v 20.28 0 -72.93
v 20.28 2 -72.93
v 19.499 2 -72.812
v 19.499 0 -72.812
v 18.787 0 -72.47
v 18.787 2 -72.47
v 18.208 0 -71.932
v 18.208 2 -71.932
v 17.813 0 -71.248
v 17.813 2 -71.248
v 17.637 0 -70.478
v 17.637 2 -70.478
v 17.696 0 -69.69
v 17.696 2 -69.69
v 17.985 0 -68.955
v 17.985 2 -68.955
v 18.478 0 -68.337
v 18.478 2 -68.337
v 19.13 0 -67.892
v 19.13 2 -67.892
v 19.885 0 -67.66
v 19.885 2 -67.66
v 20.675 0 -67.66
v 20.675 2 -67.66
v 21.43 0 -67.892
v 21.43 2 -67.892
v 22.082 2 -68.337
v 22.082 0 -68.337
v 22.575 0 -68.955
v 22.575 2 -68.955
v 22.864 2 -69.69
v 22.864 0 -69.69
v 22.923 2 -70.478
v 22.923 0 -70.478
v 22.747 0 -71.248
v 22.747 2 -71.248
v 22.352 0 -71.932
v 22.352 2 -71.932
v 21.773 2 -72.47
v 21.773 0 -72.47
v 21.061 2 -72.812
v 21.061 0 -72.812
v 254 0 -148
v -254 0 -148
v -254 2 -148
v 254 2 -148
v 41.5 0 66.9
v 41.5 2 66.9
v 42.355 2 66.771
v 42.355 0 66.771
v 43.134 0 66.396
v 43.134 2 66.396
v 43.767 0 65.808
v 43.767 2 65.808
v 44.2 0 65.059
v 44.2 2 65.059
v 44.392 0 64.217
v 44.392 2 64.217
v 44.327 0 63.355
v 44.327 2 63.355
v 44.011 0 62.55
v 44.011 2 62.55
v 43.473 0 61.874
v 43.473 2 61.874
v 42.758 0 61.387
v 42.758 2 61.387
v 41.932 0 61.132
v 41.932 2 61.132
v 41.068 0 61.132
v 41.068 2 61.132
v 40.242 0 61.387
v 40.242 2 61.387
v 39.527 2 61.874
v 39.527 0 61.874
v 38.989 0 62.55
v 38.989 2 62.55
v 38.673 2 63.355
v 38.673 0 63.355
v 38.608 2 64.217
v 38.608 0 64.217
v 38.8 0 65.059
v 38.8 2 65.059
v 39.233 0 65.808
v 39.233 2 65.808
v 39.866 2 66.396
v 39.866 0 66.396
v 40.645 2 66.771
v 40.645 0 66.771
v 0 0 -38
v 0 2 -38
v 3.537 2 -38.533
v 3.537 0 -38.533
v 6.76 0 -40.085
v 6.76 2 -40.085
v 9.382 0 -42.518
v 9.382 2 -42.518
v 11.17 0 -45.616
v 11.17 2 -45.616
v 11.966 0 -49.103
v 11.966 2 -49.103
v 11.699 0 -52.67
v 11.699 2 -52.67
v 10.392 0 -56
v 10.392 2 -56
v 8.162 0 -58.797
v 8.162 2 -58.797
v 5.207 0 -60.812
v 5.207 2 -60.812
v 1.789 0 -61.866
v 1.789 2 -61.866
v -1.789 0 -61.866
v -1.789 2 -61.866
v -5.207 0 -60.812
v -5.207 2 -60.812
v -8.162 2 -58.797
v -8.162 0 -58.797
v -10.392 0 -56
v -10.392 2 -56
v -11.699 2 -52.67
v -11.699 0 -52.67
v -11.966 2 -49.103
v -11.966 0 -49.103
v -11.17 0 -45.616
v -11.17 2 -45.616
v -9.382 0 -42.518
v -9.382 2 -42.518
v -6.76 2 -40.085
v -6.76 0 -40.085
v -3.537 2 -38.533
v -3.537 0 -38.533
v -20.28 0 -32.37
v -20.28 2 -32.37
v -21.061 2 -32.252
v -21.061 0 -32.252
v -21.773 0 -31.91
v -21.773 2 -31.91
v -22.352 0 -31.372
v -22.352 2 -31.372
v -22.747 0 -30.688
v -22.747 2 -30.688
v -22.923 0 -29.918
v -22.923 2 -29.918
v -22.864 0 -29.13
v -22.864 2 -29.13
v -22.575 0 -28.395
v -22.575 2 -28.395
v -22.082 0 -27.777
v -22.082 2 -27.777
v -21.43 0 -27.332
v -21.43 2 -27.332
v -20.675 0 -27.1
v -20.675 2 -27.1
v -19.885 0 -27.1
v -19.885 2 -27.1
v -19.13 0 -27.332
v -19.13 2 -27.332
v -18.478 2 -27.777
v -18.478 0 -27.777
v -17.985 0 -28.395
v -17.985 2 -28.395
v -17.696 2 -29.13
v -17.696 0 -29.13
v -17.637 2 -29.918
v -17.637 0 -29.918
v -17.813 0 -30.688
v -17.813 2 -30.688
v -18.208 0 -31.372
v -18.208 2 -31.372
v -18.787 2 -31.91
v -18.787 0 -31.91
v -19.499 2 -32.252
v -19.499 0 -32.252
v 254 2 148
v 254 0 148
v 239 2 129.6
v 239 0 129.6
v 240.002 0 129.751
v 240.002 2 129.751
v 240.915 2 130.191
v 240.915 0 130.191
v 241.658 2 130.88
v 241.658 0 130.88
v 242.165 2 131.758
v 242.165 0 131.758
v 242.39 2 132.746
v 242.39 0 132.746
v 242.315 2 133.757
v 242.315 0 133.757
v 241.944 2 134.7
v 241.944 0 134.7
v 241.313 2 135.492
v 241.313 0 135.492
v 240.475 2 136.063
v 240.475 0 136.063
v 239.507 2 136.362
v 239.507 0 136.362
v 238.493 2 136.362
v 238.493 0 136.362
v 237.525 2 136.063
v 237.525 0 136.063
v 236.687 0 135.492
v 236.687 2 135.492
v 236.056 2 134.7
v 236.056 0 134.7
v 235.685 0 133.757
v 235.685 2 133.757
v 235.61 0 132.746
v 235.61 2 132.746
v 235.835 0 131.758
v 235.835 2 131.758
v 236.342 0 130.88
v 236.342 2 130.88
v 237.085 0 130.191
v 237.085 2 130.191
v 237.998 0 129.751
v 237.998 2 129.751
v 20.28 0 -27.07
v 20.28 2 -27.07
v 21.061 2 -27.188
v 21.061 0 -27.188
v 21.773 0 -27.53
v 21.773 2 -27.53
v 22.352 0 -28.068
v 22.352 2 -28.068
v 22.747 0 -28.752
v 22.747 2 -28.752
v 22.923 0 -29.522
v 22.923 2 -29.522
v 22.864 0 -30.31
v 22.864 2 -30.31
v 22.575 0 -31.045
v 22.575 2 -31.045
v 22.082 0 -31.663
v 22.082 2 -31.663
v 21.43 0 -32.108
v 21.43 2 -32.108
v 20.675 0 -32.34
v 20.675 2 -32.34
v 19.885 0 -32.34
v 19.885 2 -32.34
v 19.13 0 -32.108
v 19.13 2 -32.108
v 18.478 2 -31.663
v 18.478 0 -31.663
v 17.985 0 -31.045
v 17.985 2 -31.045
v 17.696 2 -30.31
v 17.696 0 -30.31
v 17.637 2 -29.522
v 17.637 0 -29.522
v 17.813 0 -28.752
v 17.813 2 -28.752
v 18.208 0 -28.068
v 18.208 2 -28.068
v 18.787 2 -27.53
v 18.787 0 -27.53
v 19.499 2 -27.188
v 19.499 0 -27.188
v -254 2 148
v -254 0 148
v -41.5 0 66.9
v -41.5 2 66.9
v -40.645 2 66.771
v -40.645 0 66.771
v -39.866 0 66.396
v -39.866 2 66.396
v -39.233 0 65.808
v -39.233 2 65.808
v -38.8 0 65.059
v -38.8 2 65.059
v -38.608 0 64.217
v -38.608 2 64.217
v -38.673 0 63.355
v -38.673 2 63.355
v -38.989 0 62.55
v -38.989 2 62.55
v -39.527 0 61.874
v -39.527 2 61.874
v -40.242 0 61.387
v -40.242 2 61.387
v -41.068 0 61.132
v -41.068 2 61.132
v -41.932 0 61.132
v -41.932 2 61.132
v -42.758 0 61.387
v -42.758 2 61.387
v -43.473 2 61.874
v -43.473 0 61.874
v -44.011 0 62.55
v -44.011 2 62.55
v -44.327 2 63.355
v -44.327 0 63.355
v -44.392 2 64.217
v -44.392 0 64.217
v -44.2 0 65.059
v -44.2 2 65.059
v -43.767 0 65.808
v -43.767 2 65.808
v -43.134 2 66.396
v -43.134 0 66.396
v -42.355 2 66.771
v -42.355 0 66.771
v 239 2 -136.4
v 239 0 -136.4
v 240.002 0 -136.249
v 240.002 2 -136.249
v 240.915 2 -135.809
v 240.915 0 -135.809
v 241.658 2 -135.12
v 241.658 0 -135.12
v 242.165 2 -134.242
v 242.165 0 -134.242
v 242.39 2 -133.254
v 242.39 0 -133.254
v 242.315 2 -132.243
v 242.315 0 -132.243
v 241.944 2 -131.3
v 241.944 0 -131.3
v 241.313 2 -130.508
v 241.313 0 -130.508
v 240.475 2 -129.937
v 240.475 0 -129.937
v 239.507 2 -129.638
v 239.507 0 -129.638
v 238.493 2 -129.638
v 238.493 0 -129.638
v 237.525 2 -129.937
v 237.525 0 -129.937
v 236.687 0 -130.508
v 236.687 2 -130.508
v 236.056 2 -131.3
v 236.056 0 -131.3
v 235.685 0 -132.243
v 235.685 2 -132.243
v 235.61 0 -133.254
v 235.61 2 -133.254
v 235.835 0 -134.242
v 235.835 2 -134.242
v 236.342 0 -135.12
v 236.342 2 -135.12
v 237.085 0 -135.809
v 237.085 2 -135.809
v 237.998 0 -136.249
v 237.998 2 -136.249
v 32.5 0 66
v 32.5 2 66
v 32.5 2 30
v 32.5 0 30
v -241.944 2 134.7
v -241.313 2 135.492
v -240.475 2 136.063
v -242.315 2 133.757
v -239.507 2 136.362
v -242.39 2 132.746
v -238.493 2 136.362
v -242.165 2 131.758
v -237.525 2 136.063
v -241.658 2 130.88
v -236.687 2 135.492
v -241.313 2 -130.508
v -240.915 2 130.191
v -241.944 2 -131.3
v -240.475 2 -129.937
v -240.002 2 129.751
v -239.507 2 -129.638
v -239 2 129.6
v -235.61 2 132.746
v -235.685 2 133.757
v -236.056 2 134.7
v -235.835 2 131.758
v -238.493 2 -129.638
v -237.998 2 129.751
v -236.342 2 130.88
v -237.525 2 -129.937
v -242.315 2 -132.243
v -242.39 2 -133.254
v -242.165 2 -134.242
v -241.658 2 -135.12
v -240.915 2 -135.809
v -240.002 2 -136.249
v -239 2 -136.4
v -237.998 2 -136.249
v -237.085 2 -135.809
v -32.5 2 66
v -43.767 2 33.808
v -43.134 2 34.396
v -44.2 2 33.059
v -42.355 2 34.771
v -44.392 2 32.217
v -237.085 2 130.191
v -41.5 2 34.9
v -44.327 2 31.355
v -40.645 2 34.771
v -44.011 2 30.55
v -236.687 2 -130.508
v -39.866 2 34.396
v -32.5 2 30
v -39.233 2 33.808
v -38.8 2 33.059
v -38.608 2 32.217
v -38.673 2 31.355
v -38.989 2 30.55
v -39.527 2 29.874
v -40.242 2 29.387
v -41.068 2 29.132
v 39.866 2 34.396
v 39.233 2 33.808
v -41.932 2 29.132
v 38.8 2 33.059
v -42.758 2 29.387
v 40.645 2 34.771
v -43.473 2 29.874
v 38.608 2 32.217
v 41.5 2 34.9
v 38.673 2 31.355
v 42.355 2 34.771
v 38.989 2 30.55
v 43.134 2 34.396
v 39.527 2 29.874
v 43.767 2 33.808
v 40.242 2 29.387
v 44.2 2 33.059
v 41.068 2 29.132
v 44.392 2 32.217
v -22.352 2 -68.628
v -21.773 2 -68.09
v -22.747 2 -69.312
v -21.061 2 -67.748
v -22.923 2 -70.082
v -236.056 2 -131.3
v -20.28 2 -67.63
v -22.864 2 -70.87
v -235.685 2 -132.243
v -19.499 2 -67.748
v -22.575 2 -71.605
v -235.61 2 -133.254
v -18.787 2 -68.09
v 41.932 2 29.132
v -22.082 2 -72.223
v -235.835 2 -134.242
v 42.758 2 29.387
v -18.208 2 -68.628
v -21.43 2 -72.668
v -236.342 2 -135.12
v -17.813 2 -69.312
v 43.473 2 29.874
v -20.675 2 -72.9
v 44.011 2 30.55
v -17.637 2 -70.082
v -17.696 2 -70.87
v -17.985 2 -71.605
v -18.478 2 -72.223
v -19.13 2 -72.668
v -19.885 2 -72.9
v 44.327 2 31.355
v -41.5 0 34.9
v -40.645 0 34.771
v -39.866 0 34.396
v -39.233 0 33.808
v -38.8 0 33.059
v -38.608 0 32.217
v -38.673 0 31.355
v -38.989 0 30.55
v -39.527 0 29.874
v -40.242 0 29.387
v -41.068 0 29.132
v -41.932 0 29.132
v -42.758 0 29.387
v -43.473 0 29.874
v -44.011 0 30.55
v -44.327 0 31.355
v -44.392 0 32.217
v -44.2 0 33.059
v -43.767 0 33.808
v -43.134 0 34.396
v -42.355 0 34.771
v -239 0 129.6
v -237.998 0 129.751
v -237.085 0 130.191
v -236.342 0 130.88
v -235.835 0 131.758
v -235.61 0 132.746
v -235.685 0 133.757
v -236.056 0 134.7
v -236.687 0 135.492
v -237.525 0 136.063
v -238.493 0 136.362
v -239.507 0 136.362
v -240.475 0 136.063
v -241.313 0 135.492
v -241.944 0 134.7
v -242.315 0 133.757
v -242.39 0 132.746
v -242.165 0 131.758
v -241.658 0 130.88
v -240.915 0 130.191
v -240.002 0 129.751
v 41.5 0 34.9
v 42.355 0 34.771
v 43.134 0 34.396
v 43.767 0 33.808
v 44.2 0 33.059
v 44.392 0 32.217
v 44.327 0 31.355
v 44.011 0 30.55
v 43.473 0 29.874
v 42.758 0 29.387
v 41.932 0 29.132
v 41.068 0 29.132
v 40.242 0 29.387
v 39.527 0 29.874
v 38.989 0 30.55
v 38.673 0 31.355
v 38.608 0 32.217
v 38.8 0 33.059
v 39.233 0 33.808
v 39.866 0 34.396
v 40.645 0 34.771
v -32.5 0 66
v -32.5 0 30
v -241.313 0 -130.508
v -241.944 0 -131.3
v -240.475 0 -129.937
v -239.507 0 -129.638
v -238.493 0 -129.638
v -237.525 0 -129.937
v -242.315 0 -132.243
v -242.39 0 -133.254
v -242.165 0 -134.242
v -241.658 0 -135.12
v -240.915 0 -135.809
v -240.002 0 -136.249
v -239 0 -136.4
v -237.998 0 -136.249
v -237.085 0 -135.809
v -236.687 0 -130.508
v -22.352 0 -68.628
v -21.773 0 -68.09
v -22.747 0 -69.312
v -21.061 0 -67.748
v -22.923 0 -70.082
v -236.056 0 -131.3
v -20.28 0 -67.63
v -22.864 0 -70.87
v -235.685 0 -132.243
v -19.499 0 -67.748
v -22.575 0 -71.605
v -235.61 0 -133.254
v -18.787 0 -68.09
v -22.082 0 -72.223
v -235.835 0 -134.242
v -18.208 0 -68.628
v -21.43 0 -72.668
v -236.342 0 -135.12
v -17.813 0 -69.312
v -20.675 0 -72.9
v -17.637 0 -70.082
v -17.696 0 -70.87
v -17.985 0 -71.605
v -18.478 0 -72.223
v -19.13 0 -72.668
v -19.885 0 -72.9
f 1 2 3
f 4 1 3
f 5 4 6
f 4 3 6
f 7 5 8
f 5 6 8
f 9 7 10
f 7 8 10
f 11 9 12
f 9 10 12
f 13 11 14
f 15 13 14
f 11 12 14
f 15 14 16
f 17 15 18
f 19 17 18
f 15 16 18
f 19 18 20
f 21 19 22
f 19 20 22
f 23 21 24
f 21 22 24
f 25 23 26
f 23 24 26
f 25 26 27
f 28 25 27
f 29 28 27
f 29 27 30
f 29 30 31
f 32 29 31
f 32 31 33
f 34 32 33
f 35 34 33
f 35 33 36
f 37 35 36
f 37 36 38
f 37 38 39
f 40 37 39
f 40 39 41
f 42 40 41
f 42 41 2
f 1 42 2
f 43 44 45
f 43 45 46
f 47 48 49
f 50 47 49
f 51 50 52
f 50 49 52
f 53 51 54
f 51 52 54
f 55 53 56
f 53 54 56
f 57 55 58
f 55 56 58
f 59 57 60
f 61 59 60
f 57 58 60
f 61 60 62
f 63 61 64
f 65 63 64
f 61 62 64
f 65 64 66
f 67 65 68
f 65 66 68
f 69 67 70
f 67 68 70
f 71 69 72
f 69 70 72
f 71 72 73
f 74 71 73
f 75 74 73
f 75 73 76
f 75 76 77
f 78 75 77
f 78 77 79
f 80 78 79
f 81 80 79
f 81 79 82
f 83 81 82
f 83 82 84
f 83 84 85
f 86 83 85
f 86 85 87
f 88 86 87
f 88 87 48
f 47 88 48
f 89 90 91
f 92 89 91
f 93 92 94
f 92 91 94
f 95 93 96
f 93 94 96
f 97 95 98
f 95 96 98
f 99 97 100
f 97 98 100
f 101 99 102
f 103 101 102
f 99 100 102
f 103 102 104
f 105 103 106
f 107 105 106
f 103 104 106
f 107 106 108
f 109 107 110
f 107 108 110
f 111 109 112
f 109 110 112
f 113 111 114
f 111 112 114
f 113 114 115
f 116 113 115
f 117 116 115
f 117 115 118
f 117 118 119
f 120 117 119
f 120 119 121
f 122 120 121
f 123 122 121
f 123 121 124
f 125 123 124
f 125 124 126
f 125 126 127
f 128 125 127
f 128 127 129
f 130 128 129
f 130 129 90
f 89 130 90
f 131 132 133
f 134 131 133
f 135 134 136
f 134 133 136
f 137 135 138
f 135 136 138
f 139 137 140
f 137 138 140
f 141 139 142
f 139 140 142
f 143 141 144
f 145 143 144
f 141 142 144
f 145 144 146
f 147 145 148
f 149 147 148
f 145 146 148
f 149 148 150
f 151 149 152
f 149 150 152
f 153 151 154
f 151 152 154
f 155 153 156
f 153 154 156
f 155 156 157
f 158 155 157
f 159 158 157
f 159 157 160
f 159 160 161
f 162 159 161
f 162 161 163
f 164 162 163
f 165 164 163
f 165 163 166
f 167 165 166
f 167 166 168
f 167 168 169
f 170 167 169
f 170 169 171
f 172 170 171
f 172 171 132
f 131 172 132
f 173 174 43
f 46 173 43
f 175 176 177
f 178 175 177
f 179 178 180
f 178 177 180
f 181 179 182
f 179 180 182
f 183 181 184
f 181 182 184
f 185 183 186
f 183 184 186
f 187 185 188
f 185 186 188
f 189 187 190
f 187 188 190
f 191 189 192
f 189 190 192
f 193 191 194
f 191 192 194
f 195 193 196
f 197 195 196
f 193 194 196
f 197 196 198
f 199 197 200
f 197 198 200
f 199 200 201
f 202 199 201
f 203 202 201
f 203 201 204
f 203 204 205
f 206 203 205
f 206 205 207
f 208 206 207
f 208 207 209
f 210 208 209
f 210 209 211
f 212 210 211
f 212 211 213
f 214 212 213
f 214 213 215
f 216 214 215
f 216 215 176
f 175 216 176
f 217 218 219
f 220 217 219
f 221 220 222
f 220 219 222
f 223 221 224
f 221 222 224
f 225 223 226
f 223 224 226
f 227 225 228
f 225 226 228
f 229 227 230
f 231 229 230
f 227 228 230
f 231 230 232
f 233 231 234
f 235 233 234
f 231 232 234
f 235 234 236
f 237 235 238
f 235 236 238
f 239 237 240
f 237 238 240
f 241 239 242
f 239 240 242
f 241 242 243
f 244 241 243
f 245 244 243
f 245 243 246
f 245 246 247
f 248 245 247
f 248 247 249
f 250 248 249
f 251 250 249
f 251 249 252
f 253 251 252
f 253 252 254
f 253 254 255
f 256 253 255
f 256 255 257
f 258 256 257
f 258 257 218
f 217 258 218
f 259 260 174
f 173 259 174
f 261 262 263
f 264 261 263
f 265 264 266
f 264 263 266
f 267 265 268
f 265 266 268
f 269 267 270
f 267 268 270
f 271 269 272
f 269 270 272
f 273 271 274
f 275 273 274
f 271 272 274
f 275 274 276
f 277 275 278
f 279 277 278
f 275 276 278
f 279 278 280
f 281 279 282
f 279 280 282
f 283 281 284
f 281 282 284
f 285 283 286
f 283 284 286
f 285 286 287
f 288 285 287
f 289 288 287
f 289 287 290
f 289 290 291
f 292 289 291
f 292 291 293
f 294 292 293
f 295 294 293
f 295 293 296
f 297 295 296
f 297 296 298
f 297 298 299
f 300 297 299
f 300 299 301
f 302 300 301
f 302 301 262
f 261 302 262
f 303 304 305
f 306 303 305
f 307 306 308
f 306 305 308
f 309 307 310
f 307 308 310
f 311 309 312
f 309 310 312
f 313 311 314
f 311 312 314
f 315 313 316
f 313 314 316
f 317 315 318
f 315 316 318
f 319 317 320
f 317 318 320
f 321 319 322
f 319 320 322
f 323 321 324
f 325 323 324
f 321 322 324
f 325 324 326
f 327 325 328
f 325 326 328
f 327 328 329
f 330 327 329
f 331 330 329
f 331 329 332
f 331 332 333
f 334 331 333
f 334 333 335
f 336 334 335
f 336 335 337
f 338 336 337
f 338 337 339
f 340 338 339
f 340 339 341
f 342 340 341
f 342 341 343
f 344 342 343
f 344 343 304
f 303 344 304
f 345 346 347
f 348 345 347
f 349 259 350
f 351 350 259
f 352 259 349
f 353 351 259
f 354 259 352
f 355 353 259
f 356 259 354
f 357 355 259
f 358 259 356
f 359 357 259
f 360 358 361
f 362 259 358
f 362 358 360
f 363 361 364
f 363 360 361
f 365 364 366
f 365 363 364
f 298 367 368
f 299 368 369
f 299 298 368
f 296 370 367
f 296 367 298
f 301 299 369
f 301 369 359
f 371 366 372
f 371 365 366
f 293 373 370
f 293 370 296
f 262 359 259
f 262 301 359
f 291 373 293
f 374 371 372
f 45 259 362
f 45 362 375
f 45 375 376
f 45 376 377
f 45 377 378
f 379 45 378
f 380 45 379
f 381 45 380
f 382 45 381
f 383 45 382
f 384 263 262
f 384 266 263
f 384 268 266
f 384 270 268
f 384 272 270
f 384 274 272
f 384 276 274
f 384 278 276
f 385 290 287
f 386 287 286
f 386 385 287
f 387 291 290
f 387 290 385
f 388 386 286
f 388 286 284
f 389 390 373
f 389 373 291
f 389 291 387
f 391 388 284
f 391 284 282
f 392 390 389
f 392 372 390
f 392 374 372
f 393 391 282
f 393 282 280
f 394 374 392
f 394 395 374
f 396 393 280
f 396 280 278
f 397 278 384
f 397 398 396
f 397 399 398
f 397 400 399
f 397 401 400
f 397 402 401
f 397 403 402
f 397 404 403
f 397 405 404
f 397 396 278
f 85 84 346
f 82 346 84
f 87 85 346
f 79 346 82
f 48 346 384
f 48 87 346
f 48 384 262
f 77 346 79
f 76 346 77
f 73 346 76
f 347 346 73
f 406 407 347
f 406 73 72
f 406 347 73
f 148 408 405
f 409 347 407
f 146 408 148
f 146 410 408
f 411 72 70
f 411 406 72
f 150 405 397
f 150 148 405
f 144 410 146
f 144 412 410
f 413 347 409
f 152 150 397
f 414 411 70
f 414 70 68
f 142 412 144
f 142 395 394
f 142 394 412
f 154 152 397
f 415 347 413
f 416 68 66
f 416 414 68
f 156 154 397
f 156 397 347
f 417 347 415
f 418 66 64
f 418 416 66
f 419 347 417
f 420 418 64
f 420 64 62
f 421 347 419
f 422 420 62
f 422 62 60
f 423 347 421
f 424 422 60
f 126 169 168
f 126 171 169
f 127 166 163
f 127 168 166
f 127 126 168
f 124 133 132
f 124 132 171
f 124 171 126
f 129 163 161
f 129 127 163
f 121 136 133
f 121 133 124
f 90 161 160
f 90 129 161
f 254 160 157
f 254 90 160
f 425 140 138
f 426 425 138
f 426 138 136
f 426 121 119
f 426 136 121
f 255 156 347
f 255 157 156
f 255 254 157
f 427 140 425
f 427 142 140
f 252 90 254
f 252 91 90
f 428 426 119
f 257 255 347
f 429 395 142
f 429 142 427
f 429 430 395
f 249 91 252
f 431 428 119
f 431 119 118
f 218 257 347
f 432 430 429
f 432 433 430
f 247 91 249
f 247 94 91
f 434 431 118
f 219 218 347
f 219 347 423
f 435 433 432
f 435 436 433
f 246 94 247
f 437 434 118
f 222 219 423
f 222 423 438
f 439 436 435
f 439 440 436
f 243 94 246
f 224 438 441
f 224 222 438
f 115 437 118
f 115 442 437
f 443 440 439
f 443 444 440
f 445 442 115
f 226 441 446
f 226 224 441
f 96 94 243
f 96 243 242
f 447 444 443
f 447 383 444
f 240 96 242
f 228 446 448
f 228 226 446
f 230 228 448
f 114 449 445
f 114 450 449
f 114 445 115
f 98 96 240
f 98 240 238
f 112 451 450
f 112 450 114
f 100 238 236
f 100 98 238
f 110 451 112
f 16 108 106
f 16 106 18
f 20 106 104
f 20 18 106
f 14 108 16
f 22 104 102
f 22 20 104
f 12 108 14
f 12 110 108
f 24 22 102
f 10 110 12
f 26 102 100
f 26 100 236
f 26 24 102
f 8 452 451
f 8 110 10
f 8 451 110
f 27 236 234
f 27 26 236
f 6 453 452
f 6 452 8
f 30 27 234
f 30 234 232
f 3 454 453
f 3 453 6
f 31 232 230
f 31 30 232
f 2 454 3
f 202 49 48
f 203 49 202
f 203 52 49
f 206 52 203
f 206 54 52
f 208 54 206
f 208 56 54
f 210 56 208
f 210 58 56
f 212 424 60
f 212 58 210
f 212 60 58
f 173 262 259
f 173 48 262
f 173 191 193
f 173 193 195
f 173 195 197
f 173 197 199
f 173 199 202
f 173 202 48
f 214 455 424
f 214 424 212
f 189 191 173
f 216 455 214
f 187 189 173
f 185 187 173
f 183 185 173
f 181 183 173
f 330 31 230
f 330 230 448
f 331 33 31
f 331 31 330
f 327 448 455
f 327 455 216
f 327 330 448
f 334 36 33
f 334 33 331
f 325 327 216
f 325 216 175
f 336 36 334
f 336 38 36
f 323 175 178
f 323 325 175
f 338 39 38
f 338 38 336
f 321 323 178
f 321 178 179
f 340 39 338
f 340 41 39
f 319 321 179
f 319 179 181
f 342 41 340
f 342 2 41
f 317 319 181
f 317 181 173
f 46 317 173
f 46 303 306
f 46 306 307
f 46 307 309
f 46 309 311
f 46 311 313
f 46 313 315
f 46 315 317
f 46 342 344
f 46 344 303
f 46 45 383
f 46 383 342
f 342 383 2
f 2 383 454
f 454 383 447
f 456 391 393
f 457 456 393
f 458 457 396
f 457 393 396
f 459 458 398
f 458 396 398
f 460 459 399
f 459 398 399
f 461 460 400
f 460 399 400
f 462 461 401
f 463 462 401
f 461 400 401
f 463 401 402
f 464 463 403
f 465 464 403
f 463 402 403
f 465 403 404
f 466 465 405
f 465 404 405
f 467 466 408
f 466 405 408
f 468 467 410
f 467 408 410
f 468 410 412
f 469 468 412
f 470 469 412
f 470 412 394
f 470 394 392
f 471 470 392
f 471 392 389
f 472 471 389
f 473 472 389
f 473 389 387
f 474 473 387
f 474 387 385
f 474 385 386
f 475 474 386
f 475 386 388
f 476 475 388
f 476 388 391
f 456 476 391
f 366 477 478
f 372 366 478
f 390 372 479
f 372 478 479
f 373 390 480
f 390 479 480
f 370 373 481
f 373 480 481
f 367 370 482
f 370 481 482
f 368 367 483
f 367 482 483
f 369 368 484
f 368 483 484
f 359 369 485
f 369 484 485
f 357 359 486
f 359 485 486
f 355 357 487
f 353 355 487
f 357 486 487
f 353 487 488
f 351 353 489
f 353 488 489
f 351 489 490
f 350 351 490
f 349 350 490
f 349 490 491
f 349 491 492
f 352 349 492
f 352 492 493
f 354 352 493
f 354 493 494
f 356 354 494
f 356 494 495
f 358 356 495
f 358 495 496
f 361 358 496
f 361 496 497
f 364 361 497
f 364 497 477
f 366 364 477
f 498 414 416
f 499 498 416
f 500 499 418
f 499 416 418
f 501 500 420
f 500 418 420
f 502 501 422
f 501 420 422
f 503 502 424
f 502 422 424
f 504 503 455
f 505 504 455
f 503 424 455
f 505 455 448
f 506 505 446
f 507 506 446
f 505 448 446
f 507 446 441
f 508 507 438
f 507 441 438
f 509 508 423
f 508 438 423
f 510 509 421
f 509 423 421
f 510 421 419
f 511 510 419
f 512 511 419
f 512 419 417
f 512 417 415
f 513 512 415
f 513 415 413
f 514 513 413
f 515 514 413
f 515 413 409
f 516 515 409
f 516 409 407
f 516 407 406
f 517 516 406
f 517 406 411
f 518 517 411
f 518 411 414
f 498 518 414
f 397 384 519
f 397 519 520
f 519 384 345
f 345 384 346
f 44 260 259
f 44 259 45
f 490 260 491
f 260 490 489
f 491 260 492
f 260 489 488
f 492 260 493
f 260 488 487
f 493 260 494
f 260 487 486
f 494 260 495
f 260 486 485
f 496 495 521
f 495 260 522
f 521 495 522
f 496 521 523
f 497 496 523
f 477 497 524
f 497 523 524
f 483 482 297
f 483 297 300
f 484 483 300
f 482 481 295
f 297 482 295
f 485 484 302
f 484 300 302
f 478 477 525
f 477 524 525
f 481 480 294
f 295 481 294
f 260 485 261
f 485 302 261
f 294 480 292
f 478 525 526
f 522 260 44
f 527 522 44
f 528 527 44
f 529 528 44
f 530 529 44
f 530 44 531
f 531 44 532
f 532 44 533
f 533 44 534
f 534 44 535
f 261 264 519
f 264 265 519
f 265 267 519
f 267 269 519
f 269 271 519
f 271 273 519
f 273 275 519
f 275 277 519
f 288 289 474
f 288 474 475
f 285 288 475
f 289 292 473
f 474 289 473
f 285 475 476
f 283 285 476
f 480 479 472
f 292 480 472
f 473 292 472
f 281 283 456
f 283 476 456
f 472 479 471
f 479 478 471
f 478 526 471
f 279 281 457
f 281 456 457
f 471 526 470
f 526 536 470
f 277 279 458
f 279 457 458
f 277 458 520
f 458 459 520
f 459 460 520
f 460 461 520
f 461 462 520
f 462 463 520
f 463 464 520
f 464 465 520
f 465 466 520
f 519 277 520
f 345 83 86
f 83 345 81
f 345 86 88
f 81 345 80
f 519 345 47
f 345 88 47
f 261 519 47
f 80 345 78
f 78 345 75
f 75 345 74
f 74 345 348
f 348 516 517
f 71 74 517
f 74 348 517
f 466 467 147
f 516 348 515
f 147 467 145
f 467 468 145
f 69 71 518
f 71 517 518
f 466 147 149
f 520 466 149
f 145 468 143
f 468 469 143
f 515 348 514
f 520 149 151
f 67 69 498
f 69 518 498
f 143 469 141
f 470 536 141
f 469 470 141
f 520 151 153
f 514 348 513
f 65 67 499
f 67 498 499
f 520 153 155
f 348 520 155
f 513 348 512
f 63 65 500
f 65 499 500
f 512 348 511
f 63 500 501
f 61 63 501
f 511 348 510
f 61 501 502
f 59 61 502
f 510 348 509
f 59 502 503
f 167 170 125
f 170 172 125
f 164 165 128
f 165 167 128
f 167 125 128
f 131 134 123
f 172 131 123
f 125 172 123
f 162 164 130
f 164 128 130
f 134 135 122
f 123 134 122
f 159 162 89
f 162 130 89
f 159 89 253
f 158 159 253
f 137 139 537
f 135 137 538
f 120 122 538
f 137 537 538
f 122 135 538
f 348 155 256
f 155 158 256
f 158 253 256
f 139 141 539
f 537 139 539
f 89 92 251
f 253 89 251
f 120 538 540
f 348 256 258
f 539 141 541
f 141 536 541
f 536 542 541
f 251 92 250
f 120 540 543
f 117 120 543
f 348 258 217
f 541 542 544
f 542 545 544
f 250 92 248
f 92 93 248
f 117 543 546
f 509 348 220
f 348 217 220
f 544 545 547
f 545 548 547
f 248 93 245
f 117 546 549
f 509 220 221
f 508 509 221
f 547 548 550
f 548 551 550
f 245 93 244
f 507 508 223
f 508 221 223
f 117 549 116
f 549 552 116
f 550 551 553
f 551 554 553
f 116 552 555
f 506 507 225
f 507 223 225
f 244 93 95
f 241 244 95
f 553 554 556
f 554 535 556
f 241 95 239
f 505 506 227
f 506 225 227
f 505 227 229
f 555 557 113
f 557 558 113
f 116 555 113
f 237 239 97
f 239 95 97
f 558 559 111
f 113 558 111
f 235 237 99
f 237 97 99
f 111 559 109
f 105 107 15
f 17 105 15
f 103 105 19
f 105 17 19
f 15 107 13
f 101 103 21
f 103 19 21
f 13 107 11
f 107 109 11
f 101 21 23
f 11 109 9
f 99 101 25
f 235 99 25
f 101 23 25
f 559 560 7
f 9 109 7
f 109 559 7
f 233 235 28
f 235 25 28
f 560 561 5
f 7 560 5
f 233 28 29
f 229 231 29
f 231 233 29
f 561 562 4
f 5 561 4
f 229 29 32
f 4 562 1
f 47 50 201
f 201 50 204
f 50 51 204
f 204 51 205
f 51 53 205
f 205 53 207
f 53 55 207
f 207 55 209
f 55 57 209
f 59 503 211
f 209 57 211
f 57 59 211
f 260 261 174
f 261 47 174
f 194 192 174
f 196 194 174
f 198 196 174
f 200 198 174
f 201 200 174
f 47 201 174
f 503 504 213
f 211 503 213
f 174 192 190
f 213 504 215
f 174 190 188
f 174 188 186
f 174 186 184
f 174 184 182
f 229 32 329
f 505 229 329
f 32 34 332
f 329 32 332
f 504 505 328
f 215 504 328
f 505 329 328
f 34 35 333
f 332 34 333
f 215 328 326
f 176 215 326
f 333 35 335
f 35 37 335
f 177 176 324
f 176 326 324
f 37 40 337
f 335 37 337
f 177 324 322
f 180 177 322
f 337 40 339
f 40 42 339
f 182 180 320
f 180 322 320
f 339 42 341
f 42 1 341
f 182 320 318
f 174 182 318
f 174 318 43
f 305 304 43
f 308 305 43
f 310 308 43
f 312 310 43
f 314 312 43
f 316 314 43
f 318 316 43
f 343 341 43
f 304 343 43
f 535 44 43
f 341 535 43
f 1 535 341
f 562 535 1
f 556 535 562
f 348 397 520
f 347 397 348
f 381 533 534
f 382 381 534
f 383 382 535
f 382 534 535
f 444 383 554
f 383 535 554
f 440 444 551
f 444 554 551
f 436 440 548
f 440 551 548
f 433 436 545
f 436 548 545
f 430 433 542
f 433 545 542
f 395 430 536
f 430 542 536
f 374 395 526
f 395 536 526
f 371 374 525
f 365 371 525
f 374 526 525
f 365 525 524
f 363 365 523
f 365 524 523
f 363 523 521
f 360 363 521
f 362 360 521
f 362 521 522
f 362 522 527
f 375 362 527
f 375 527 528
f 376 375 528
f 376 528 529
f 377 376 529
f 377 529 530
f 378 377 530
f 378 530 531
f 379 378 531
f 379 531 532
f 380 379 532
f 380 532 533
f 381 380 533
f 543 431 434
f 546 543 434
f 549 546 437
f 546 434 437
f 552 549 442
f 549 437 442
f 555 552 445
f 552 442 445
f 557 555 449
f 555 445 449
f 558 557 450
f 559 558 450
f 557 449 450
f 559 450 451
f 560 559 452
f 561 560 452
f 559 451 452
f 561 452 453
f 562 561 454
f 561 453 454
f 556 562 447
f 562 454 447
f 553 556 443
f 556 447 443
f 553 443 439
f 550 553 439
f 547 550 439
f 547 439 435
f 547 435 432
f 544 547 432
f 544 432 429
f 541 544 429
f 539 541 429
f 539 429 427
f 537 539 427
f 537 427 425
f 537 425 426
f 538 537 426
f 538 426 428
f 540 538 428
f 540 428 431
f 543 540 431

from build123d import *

# Parameters (mm, degrees)
SKETCH1_W           = 508
SKETCH1_H           = 296
BOSS_EXTRUDE1_DEPTH = 2
SKETCH2_R           = 12
SKETCH2_R_2         = 2.65
SKETCH2_R_3         = 2.9
SKETCH2_W           = 65
SKETCH2_H           = 36
CUT_EXTRUDE1_DEPTH  = 10
SKETCH4_R           = 3.4
CUT_EXTRUDE2_DEPTH  = 10


with BuildPart() as part:
    # Sketch1 → Boss-Extrude1 (new body)
    with BuildSketch(Plane(origin=(0, 0, 0), x_dir=(1, 0, 0), z_dir=(0, 1, 0))):
        Rectangle(SKETCH1_W, SKETCH1_H)
    extrude(amount=BOSS_EXTRUDE1_DEPTH)

    # Sketch2 → Cut-Extrude1 (cut)
    with BuildSketch(Plane(origin=(0, 2, 0), x_dir=(1, 0, 0), z_dir=(0, 1, 0))):
        with Locations(Location((0, 50, 0), (0, 0, 270))):
            Circle(SKETCH2_R)
        with Locations(Location((-20.28, 70.28, 0), (0, 0, 270))):
            Circle(SKETCH2_R_2)
        with Locations(Location((-20.28, 29.72, 0), (0, 0, 90))):
            Circle(SKETCH2_R_2)
        with Locations(Location((20.28, 29.72, 0), (0, 0, 270))):
            Circle(SKETCH2_R_2)
        with Locations(Location((20.28, 70.28, 0), (0, 0, 90))):
            Circle(SKETCH2_R_2)
        with Locations(Location((41.5, -32, 0), (0, 0, 270))):
            Circle(SKETCH2_R_3)
        with Locations(Location((41.5, -64, 0), (0, 0, 270))):
            Circle(SKETCH2_R_3)
        with Locations(Location((-41.5, -64, 0), (0, 0, 270))):
            Circle(SKETCH2_R_3)
        with Locations(Location((-41.5, -32, 0), (0, 0, 270))):
            Circle(SKETCH2_R_3)
        with Locations((0, -48)):
            Rectangle(SKETCH2_W, SKETCH2_H)
    extrude(amount=-CUT_EXTRUDE1_DEPTH, mode=Mode.SUBTRACT)

    # Sketch4 → Cut-Extrude2 (cut)
    with BuildSketch(Plane.XZ):
        with Locations(Location((-239, 133, 0), (0, 0, 270))):
            Circle(SKETCH4_R)
        with Locations(Location((239, 133, 0), (0, 0, 270))):
            Circle(SKETCH4_R)
        with Locations(Location((-239, -133, 0), (0, 0, 270))):
            Circle(SKETCH4_R)
        with Locations(Location((239, -133, 0), (0, 0, 270))):
            Circle(SKETCH4_R)
    extrude(amount=-CUT_EXTRUDE2_DEPTH, mode=Mode.SUBTRACT)


solid = part.part
